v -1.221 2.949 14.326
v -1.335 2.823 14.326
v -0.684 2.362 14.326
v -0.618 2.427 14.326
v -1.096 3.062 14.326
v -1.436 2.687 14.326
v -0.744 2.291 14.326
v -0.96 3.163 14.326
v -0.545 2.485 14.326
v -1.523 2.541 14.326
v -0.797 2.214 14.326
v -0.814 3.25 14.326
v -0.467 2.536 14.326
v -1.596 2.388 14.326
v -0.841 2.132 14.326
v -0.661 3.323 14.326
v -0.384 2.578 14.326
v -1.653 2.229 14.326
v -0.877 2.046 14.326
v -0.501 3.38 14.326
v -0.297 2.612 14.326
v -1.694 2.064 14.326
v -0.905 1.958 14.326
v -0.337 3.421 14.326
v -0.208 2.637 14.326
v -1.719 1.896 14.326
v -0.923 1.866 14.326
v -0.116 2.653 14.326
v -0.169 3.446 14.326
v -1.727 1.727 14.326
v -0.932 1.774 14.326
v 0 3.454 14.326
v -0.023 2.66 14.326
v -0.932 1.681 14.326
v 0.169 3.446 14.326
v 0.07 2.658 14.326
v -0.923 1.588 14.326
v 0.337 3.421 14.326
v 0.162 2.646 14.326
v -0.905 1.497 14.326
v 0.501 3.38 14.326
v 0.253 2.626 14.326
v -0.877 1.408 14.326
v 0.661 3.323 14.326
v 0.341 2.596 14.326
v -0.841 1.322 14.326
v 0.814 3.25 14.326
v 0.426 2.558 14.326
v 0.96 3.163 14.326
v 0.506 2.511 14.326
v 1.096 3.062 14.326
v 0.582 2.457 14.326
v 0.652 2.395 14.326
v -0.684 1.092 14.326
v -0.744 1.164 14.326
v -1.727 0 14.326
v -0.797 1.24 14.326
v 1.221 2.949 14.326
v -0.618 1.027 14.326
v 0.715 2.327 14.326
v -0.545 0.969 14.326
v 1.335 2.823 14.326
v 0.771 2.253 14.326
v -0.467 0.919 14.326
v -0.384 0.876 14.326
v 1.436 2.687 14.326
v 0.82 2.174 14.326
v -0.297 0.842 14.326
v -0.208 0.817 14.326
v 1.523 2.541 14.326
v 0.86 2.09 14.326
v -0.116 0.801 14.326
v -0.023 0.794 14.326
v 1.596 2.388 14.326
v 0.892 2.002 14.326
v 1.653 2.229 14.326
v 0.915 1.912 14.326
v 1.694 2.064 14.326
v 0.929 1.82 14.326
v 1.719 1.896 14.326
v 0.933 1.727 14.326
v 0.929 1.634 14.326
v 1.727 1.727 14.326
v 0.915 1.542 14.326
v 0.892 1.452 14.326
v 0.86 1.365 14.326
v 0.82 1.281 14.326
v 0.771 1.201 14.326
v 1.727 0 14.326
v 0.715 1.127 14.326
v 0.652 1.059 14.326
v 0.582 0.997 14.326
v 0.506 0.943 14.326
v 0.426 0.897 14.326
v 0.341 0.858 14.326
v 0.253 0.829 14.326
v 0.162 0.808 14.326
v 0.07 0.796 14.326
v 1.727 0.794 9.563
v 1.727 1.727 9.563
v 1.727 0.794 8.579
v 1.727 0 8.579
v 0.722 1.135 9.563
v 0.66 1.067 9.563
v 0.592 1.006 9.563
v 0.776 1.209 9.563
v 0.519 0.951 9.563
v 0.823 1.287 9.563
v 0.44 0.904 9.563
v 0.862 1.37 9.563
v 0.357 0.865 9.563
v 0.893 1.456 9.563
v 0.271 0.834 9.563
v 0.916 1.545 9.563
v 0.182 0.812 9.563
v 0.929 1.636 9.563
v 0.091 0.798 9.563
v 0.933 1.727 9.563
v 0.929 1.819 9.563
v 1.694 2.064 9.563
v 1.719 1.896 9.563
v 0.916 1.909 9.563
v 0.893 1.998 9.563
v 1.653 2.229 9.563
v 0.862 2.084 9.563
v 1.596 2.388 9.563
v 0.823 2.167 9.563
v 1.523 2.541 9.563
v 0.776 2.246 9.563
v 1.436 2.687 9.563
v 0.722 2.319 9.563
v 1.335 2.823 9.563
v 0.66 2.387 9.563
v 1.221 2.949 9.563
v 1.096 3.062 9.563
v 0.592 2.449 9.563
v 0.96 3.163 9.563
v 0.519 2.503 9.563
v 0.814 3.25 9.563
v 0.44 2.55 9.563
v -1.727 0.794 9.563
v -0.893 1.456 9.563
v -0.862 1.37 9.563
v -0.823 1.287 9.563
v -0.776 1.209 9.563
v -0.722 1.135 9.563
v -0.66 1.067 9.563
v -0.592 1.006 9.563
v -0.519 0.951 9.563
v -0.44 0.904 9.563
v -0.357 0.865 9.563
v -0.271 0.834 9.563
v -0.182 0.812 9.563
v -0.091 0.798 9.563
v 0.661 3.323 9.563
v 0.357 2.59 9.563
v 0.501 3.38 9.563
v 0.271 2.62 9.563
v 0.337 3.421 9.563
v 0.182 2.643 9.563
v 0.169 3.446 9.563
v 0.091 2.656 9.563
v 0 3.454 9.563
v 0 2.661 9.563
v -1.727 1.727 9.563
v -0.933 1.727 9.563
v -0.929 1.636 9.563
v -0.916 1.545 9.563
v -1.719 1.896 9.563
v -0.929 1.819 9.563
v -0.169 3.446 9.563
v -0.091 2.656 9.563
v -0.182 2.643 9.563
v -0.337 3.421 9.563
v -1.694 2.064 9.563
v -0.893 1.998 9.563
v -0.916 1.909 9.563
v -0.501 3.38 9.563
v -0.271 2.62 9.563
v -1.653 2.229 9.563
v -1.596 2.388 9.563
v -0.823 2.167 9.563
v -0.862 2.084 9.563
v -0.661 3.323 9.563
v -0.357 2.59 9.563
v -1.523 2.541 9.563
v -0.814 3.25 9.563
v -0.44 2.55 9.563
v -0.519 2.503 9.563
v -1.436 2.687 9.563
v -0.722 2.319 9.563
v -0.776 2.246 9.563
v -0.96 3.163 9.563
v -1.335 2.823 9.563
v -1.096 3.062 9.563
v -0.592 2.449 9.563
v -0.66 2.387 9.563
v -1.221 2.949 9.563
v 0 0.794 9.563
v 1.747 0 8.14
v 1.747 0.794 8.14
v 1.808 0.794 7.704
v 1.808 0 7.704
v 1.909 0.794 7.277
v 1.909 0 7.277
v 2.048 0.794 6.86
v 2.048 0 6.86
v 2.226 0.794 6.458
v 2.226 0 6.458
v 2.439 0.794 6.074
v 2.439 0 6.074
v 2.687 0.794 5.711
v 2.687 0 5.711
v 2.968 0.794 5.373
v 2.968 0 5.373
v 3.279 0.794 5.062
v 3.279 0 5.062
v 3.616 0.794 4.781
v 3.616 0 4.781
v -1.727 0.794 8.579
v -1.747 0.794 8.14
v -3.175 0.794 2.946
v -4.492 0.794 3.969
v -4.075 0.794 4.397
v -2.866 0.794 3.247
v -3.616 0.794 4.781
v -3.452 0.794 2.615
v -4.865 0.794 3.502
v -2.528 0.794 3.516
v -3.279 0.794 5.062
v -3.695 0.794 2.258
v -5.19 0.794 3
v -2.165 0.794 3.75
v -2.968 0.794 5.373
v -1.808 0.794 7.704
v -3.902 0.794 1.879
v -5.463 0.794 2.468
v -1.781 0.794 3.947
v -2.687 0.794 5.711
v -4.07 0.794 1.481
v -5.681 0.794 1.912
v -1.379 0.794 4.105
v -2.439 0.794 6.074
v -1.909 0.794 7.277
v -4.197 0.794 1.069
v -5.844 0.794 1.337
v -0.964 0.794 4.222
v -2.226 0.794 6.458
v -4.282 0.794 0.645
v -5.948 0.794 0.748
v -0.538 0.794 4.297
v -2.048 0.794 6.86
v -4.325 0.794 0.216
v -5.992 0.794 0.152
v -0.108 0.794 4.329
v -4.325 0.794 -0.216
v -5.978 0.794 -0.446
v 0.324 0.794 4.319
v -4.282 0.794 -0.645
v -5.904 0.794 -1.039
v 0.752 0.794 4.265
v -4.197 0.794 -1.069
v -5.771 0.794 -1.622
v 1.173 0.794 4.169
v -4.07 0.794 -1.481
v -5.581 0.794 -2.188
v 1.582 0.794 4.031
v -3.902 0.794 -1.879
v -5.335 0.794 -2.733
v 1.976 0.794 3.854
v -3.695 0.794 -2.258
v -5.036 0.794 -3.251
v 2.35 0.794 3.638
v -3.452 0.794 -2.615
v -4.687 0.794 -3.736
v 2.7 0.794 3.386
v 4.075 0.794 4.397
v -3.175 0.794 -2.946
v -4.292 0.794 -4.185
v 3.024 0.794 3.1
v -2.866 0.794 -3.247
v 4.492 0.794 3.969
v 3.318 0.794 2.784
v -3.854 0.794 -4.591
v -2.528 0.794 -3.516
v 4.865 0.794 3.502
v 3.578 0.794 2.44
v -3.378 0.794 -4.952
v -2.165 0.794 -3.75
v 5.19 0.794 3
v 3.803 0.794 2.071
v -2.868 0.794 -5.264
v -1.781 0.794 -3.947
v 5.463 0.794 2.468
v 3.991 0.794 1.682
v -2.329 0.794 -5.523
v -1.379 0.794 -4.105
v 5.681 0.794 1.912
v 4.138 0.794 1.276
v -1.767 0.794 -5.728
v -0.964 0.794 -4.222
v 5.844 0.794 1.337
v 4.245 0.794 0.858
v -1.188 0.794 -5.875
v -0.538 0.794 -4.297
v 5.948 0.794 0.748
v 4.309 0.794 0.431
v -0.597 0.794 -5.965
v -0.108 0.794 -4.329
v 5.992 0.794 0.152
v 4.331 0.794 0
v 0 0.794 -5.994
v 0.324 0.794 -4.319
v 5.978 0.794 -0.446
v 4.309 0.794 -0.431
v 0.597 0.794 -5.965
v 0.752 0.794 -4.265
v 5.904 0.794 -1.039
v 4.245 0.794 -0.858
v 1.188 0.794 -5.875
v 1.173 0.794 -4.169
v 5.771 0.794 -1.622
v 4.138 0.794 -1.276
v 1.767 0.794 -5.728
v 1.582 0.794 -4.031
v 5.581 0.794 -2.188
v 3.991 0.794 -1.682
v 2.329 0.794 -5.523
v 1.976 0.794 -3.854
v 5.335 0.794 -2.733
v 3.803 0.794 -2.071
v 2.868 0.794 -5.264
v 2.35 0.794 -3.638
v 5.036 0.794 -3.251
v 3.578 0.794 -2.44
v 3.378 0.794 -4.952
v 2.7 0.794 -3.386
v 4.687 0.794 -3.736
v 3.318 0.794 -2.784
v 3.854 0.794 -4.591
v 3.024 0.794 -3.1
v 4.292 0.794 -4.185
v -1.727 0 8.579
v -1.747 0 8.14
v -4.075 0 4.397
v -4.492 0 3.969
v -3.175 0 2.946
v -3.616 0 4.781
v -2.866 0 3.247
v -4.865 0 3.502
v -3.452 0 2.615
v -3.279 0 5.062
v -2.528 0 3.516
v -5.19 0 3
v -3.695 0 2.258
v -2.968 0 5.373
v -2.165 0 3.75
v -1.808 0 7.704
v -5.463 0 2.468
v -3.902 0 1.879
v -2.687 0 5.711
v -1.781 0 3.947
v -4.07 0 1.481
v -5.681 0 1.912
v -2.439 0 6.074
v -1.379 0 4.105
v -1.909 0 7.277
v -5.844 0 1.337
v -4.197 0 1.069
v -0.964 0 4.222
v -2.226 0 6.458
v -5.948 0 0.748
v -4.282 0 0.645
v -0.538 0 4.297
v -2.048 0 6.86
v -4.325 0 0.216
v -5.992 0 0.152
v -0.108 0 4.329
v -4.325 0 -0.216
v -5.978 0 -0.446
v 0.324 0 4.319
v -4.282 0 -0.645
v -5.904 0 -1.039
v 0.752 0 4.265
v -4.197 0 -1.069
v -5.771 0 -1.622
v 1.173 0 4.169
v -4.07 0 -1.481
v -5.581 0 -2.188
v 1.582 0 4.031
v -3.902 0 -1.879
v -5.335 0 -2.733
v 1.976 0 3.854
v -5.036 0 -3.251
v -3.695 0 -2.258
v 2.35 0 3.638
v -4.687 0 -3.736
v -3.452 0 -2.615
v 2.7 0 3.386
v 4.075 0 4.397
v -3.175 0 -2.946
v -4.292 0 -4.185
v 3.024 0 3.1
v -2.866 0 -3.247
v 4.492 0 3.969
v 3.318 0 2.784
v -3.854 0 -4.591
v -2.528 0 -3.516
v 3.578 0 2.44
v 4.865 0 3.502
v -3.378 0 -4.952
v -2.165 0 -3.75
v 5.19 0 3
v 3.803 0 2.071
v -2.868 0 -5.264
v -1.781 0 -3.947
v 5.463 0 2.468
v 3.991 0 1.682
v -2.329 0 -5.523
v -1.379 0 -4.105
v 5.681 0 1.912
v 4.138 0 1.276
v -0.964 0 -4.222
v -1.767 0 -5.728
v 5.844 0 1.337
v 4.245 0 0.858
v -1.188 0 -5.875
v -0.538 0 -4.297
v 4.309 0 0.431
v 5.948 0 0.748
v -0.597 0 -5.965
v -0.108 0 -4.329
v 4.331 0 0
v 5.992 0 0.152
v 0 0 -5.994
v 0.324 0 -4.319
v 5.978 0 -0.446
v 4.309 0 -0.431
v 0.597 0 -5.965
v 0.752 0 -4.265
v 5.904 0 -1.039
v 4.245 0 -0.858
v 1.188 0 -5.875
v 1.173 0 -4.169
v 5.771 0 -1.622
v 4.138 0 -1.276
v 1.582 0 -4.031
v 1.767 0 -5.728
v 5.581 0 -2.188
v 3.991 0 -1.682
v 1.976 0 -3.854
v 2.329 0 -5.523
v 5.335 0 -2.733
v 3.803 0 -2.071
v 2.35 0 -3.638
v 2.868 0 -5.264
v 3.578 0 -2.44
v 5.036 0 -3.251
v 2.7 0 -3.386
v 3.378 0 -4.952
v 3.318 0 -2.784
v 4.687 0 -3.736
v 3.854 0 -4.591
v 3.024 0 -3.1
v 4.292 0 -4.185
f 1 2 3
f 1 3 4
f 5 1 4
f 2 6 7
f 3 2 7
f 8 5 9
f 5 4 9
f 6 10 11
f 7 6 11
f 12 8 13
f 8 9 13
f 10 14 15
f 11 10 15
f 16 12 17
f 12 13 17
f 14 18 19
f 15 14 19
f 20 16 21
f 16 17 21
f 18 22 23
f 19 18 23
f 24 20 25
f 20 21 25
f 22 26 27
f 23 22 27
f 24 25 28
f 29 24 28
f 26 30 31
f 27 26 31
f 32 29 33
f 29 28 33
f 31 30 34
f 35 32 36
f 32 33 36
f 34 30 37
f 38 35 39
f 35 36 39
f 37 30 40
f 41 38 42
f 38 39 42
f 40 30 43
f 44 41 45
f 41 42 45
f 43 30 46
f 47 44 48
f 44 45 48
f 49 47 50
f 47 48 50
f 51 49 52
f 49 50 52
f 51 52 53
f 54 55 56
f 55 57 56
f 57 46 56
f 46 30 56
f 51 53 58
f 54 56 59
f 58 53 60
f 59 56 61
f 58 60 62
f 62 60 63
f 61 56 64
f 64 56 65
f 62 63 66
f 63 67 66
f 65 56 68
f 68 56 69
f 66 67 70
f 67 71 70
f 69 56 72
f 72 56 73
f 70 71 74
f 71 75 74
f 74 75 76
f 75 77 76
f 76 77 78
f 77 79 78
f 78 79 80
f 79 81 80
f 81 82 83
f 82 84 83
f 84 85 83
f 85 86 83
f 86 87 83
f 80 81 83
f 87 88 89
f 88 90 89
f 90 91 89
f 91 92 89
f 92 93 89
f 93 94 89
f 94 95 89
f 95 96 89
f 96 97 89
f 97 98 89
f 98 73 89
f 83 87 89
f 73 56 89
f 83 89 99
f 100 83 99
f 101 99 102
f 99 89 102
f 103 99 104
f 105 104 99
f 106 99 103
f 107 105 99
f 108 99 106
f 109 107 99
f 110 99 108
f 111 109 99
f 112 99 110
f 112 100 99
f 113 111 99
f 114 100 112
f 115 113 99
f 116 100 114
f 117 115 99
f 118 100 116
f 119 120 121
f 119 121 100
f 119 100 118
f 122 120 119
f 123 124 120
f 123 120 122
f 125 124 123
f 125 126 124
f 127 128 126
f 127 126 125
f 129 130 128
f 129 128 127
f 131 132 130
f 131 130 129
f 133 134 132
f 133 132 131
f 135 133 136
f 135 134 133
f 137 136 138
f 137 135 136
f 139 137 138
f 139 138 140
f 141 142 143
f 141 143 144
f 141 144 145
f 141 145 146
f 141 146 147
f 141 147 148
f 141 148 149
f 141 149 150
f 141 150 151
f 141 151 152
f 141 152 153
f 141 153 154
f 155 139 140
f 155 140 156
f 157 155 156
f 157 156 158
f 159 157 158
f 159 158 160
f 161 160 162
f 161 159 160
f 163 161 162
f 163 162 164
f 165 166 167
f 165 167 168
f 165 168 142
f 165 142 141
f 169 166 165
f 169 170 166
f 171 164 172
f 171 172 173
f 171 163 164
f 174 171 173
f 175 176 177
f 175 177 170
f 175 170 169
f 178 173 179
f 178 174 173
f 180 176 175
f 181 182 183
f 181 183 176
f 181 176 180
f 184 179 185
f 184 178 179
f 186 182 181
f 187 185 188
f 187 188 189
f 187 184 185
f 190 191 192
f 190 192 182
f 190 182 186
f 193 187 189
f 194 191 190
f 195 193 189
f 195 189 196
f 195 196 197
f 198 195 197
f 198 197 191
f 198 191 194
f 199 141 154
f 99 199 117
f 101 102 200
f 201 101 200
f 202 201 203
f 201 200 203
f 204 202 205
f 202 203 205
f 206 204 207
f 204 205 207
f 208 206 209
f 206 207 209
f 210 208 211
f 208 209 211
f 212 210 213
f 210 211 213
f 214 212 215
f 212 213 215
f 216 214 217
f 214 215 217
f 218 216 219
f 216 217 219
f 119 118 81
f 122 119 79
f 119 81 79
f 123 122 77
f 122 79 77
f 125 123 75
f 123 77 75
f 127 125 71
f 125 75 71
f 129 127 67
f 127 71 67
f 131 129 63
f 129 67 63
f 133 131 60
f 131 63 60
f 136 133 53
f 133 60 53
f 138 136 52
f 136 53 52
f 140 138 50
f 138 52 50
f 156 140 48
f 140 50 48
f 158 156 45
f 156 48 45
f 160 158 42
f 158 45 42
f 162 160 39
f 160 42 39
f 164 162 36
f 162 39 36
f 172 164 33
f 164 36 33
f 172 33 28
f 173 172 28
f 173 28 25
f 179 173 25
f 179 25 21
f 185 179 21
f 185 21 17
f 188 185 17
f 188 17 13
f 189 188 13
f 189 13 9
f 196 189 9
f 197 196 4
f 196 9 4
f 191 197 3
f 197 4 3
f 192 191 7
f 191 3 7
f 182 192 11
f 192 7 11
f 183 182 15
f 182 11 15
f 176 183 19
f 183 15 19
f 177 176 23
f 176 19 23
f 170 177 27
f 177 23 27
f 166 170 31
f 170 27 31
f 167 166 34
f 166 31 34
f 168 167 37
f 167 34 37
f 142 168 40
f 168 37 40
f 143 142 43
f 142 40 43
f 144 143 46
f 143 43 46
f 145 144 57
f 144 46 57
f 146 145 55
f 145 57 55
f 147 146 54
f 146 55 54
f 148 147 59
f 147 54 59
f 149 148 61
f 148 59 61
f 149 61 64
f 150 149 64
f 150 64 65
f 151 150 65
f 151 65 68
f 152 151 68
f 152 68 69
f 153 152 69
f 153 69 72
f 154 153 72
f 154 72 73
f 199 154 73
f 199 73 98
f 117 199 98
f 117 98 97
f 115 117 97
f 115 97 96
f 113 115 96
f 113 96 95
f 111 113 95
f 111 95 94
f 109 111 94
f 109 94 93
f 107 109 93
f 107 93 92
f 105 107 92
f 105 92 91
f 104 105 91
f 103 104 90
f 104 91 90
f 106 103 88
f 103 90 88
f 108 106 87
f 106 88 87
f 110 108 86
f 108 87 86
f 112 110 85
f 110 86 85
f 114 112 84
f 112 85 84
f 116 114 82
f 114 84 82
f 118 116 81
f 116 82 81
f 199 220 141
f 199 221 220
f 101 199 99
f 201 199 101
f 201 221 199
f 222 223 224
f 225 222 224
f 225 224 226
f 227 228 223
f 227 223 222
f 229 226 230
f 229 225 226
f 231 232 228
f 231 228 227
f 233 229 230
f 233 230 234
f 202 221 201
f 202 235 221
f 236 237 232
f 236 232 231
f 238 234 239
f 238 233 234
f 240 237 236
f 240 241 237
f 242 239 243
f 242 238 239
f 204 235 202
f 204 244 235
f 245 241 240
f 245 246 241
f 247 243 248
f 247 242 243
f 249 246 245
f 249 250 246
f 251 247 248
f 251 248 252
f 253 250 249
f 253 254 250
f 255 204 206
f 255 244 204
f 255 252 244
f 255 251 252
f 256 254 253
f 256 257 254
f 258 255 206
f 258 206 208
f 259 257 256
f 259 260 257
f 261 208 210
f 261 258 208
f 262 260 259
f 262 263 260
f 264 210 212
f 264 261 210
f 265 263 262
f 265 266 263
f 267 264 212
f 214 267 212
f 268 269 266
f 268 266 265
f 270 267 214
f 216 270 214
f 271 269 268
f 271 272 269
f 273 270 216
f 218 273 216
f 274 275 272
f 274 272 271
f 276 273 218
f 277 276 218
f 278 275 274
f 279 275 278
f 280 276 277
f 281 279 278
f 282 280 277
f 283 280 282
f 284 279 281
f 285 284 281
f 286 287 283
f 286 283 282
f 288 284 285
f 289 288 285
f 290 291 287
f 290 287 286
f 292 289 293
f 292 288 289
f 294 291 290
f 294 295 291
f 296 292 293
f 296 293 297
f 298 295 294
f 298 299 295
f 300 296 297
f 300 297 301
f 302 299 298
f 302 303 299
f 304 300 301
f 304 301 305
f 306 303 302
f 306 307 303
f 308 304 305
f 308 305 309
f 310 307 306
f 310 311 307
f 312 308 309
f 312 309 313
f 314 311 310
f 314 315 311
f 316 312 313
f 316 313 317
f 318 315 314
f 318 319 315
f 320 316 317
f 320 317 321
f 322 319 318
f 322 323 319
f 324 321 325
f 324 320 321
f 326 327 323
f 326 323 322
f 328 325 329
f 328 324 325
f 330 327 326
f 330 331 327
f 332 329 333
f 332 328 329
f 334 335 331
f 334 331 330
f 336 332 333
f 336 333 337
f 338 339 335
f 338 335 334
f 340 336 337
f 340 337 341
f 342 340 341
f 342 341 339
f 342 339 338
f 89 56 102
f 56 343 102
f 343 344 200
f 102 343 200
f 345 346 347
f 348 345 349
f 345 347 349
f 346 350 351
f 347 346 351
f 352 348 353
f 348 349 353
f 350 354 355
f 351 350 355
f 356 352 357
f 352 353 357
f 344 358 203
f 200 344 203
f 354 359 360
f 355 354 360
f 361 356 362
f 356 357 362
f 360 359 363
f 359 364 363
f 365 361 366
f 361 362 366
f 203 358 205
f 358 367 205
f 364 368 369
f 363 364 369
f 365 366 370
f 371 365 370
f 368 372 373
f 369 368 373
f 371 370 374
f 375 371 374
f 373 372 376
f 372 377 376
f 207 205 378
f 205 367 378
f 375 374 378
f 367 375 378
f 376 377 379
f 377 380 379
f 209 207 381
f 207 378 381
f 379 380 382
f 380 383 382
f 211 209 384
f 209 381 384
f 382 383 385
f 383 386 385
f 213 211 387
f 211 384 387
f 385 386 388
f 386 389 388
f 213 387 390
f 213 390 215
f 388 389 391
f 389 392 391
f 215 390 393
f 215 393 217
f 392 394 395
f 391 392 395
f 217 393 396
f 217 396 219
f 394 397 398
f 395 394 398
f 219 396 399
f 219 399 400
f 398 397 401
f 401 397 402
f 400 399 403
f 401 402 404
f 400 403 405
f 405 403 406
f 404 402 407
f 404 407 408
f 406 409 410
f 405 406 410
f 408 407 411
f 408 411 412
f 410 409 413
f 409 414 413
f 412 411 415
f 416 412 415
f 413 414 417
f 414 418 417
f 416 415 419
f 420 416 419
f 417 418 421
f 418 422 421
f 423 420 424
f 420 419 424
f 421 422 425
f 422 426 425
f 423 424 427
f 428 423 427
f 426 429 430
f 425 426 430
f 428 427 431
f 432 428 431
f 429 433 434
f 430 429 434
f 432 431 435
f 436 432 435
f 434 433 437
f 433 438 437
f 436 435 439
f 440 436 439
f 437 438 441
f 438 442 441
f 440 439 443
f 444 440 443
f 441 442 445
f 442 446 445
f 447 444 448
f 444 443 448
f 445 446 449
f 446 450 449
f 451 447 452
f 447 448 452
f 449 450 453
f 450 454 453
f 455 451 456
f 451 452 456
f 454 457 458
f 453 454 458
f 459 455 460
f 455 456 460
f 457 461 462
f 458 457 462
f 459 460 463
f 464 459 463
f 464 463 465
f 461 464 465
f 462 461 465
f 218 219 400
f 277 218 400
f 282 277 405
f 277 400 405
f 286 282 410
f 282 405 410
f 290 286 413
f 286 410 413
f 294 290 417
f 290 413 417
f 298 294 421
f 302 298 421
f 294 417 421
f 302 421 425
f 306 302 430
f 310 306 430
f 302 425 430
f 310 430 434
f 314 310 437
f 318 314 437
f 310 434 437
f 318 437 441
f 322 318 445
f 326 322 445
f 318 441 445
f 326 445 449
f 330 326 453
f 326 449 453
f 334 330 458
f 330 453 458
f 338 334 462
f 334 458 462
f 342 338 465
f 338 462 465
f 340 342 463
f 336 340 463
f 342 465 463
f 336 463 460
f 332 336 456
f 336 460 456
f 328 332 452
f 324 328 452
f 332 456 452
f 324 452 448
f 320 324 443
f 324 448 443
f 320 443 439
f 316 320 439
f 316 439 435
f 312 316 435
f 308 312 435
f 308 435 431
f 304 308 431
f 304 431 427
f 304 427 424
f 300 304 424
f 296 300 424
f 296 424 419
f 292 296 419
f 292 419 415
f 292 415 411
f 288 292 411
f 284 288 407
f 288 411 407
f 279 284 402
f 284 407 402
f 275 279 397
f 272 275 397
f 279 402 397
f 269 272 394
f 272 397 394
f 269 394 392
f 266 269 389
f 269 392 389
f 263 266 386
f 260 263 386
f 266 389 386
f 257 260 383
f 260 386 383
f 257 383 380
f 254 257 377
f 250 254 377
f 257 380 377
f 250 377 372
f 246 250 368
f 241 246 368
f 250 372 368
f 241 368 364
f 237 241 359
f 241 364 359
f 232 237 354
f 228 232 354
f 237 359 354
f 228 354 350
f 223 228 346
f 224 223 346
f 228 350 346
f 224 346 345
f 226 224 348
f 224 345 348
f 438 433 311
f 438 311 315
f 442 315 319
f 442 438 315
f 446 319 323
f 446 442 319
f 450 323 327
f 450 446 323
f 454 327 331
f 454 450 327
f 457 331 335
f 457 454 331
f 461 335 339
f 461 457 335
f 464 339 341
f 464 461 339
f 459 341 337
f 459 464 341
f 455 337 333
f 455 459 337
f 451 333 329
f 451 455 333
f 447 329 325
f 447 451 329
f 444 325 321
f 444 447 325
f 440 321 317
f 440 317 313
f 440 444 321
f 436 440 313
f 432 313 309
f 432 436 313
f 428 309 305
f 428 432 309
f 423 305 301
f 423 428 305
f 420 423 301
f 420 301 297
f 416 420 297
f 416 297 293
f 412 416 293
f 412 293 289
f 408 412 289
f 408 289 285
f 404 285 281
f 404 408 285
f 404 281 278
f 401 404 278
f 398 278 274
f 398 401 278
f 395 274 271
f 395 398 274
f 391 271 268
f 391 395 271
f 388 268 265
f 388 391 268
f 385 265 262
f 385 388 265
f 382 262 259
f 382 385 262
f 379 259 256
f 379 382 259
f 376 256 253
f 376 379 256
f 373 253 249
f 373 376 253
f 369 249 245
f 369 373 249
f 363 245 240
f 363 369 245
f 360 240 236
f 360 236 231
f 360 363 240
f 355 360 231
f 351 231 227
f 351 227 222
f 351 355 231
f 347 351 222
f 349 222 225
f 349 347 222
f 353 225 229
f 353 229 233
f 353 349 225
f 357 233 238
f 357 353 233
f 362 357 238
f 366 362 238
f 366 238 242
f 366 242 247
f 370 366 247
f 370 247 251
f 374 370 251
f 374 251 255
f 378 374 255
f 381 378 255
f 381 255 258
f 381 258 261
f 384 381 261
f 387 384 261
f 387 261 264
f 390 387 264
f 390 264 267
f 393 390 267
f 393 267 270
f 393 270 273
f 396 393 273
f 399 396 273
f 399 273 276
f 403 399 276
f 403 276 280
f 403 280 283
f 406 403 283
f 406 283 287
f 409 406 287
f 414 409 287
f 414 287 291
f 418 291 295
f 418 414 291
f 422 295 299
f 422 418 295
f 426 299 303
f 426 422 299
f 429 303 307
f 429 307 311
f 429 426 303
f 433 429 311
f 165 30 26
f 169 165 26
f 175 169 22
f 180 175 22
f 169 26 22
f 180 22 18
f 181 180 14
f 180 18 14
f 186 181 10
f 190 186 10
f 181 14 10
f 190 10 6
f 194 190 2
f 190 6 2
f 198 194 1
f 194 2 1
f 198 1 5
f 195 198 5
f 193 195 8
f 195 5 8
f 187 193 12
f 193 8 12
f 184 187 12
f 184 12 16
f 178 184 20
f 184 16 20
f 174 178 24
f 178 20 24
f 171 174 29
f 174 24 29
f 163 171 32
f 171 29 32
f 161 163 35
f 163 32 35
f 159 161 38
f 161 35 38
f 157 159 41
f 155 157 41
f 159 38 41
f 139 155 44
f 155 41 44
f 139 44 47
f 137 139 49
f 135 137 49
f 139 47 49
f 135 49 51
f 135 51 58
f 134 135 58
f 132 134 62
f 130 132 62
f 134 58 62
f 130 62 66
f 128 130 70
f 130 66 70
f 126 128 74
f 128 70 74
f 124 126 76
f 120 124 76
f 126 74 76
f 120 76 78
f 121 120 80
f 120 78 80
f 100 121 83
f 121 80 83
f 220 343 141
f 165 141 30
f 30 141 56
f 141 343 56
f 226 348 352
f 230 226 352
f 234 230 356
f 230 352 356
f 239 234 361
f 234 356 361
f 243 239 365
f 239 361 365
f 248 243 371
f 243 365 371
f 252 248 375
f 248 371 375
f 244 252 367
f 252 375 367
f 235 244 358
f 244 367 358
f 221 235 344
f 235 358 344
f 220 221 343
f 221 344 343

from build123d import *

# Parameters (mm, degrees)
SKETCH1_R           = 4.3307
BOSS_EXTRUDE1_DEPTH = 0.79375
SKETCH2_R           = 0.93345
BOSS_EXTRUDE2_DEPTH = 4.7625


with BuildPart() as part:
    # Sketch1 → Boss-Extrude1 (new body)
    with BuildSketch(Plane(origin=(0, 0, 0), x_dir=(1, 0, 0), z_dir=(0, 1, 0))):
        with BuildLine():
            Line((-1.7272, -14.3256), (1.7272, -14.3256))
            Line((1.7272, -14.3256), (1.7272, -8.578734844))
            ThreePointArc((1.7272, -8.578734844), (2.225592247, -6.457699407), (3.616456198, -4.780593679))
            ThreePointArc((3.616456198, -4.780593679), (0, 5.9944), (-3.616456198, -4.780593679))
            ThreePointArc((-3.616456198, -4.780593679), (-2.225592247, -6.457699407), (-1.7272, -8.578734844))
            Line((-1.7272, -8.578734844), (-1.7272, -14.3256))
        make_face()
        Circle(SKETCH1_R, mode=Mode.SUBTRACT)
    extrude(amount=BOSS_EXTRUDE1_DEPTH)

    # Sketch2 → Boss-Extrude2 (add)
    with BuildSketch(Plane.XY.offset(14.3256)):
        with BuildLine():
            Line((-1.7272, 0), (-1.7272, 1.7272))
            ThreePointArc((-1.7272, 1.7272), (0, 3.4544), (1.7272, 1.7272))
            Line((1.7272, 1.7272), (1.7272, 0))
            Line((1.7272, 0), (-1.7272, 0))
        make_face()
        with Locations((0, 1.7272)):
            Circle(SKETCH2_R, mode=Mode.SUBTRACT)
    extrude(amount=-BOSS_EXTRUDE2_DEPTH)


solid = part.part
